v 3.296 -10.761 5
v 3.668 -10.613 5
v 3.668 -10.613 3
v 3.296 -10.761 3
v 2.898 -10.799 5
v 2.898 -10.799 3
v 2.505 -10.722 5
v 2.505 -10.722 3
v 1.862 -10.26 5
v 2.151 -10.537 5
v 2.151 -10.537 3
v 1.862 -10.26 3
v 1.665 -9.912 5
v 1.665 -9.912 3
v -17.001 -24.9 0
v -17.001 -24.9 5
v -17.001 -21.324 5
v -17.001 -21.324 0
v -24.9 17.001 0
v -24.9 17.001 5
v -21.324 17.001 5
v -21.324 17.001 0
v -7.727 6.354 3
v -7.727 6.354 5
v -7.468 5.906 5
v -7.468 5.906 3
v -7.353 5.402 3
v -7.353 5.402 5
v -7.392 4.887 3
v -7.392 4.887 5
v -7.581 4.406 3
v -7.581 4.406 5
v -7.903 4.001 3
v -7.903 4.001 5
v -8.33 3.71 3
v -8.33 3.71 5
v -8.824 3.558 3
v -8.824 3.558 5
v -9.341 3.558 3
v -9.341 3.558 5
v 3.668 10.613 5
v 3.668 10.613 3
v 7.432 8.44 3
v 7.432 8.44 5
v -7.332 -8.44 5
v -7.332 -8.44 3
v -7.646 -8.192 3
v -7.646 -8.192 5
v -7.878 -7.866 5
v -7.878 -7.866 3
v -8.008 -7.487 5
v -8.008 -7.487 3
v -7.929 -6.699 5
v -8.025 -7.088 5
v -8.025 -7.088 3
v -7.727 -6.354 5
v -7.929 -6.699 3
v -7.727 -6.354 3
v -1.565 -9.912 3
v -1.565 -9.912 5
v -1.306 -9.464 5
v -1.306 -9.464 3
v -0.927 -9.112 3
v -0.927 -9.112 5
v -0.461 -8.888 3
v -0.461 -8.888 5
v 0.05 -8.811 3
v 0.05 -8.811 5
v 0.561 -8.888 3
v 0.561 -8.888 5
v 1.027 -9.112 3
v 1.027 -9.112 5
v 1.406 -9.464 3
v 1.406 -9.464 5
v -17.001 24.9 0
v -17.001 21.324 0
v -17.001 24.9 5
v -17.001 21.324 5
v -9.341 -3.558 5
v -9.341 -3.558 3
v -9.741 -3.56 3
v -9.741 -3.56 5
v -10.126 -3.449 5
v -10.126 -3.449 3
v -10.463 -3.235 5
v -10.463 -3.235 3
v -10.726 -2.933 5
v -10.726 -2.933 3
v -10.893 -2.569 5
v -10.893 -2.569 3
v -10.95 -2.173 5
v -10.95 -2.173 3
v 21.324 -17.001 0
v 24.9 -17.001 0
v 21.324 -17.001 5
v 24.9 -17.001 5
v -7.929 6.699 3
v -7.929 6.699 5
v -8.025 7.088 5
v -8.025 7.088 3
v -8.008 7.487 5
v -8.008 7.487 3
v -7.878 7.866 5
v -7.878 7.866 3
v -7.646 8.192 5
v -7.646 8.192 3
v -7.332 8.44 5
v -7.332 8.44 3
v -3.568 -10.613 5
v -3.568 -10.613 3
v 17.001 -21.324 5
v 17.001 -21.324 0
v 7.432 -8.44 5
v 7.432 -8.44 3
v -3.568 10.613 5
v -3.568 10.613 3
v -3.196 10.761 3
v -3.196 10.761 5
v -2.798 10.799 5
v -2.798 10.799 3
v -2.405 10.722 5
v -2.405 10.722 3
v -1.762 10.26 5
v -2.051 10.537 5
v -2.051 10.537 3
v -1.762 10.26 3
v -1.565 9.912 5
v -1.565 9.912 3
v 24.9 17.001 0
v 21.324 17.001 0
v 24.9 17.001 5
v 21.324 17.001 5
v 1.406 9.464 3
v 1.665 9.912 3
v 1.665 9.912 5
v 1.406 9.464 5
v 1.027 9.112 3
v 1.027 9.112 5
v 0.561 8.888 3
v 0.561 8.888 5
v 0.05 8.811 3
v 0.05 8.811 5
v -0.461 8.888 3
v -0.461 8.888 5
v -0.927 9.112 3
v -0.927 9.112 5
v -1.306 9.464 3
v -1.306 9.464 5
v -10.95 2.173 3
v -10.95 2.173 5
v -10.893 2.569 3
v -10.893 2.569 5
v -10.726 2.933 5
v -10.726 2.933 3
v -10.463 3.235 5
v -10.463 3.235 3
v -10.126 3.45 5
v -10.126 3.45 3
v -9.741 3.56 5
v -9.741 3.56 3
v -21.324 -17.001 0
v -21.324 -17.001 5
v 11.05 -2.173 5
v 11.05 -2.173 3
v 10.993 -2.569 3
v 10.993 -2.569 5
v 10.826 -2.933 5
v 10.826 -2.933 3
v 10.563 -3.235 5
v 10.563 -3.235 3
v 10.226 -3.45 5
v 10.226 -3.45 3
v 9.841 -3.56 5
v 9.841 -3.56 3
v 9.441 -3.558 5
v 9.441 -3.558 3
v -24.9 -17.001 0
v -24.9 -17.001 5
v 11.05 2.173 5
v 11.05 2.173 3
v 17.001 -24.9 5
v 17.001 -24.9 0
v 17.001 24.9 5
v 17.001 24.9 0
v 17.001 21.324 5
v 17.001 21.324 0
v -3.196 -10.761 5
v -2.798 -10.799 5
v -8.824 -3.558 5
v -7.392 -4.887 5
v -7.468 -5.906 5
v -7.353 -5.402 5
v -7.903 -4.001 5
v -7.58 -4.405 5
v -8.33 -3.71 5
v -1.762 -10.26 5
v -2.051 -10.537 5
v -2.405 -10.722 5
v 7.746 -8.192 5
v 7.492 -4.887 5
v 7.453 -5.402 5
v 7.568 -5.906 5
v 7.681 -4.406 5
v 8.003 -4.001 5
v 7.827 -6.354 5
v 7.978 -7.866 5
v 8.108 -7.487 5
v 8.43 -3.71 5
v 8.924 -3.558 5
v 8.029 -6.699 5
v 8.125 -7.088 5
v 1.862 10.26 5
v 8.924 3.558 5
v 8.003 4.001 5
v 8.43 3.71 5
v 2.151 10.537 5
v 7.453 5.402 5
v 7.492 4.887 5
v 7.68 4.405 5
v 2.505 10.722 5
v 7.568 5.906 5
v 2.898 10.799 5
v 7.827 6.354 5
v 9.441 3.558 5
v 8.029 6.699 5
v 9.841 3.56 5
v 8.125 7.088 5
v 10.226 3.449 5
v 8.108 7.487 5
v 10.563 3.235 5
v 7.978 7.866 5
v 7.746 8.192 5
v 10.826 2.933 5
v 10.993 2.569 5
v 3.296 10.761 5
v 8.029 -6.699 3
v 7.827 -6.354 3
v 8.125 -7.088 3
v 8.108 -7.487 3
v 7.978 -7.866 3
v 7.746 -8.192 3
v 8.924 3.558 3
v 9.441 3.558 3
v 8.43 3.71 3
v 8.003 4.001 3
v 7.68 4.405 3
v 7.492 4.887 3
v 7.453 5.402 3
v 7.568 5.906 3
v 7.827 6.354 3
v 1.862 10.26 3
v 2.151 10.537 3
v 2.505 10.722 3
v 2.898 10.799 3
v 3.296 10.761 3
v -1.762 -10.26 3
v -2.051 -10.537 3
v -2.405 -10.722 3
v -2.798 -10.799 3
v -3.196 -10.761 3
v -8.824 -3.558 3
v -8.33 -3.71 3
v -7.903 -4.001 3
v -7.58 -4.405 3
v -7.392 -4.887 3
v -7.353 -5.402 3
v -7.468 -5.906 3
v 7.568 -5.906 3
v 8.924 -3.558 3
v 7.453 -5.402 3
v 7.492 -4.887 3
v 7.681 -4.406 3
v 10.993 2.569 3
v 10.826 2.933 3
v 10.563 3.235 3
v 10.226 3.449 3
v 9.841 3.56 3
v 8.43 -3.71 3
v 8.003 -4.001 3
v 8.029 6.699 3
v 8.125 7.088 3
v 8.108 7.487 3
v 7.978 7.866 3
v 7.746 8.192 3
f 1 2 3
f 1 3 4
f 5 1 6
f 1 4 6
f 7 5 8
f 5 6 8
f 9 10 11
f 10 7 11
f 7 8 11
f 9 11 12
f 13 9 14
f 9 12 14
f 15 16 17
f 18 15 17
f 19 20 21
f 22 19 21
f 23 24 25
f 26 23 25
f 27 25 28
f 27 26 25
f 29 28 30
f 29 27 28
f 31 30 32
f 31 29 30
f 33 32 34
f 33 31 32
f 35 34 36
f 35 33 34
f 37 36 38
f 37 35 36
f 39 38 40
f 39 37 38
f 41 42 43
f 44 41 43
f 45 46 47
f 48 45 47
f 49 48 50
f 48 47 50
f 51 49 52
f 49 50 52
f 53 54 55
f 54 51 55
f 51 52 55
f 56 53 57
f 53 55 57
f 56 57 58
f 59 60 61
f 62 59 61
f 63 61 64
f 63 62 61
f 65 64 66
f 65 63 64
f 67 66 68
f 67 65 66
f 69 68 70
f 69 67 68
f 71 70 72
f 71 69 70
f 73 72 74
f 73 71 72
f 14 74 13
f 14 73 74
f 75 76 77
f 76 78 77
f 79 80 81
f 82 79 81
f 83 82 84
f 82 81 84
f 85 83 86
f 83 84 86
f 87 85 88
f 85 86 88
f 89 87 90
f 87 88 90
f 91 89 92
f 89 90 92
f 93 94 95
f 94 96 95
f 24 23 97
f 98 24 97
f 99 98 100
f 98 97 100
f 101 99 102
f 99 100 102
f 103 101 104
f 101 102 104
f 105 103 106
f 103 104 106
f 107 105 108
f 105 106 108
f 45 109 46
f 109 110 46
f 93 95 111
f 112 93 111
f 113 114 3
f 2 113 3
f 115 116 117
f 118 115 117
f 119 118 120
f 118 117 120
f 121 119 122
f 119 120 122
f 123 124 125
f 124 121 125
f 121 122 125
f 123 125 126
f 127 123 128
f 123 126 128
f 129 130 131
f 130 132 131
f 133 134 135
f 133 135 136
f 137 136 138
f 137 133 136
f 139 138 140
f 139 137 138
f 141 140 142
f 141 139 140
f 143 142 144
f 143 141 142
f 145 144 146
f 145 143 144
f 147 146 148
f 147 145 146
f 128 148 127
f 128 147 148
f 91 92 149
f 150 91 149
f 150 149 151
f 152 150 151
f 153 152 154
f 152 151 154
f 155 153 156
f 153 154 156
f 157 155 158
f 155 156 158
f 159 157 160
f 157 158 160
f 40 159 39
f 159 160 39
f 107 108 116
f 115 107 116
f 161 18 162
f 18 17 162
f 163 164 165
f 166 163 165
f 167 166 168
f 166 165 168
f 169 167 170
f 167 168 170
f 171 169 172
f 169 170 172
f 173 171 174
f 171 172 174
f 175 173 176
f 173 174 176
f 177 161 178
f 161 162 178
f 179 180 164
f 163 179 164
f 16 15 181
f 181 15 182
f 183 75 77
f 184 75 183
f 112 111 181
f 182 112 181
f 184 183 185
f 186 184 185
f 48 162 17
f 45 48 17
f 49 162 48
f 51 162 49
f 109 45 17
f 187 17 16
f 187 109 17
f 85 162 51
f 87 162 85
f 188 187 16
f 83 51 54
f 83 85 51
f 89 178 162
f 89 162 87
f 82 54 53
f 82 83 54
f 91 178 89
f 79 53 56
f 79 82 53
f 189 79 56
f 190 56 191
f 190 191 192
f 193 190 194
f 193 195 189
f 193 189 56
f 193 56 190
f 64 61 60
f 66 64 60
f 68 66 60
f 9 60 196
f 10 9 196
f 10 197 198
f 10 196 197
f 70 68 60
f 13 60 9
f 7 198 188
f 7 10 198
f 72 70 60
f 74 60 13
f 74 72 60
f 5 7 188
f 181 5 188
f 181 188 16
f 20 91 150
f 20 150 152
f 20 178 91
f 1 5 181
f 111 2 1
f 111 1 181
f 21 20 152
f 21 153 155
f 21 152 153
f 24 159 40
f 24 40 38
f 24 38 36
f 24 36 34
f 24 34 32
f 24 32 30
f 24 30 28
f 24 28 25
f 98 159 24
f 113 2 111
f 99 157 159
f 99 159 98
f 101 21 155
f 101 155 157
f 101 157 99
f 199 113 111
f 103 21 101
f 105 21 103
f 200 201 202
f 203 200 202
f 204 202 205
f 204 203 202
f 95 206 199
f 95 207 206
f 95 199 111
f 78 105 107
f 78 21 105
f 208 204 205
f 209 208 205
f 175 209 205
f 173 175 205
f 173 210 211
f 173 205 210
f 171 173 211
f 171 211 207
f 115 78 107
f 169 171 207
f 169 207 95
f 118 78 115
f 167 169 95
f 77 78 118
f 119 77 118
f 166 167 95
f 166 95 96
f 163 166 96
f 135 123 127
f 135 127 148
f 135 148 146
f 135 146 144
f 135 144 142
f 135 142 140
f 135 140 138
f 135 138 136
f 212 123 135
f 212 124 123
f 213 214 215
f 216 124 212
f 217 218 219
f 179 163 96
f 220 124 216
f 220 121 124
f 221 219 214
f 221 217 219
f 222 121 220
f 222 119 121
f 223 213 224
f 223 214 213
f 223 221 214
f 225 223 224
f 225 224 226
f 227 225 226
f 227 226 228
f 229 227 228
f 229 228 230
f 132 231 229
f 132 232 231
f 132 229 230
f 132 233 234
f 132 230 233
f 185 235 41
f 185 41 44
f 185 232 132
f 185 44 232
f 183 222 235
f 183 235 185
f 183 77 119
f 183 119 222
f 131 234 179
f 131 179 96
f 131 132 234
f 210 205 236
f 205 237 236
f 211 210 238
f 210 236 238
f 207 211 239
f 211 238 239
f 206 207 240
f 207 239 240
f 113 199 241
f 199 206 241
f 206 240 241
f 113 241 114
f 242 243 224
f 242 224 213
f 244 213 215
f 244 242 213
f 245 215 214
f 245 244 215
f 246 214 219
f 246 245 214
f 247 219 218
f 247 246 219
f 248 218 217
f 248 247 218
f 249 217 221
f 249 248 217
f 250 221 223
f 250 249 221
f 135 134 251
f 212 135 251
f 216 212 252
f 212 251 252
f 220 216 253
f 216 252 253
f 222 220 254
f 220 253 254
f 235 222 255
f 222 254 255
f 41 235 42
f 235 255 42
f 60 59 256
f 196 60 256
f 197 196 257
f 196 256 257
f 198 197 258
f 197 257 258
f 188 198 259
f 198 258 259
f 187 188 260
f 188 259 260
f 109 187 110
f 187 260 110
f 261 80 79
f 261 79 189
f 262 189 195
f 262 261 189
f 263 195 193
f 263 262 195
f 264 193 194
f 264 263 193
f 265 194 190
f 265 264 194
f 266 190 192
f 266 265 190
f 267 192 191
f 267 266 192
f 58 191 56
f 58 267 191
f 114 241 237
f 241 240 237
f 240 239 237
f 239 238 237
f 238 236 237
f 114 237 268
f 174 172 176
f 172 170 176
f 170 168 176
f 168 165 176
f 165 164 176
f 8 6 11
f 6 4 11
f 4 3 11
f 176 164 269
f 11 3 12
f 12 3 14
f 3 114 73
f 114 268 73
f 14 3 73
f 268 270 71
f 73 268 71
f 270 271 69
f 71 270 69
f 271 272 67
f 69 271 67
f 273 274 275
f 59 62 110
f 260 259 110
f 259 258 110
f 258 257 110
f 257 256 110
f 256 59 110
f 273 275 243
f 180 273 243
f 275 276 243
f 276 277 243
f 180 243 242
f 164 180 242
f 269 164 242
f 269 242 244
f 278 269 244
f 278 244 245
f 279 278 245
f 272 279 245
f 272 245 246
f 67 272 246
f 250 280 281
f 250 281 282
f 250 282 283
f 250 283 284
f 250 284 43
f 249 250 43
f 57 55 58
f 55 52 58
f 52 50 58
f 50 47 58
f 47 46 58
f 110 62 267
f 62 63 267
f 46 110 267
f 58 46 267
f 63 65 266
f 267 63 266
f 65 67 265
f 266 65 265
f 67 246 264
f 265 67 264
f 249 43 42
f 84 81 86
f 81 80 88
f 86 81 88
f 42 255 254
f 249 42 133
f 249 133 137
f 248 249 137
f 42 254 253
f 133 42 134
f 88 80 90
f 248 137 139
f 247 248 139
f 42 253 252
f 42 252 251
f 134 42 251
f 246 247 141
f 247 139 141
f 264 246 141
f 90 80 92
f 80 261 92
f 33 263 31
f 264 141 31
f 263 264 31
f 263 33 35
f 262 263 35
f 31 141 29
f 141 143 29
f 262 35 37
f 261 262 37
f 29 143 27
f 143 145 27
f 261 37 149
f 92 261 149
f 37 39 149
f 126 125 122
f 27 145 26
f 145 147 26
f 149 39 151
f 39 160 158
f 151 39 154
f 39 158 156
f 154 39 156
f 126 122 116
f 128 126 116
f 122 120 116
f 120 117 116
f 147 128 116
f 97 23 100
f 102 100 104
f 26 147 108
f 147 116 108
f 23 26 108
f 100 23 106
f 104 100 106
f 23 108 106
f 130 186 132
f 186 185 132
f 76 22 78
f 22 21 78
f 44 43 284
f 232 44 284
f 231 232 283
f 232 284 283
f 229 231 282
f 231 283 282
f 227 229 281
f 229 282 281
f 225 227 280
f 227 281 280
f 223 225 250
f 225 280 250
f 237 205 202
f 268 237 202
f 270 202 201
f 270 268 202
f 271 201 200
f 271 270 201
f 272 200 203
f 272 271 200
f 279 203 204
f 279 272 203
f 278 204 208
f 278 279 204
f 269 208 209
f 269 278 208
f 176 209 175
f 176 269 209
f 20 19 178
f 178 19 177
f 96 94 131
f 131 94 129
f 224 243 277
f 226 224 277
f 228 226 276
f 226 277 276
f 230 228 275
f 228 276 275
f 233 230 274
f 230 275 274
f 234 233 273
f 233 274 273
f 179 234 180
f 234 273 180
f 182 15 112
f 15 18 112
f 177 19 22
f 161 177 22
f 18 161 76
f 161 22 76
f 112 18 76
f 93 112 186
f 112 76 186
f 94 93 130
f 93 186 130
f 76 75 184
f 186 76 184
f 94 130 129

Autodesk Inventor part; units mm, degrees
ref_plane "YZ Plane" through (0, 0, 0) normal (1, 0, 0) x (0, 1, 0)
ref_plane "XZ Plane" through (0, 0, 0) normal (0, 1, 0) x (-1, 0, 0)
ref_plane "XY Plane" through (0, 0, 0) normal (0, 0, 1) x (1, 0, 0)
sketch "Sketch1" plane through (0, 0, 0) normal (0, 0, 1) x (1, 0, 0)
  line L0 (-34.86, 0) -> (34.86, 0) construction
  line L1 (0, -34.86) -> (0, 34.86) construction
  line L2 (0, 0) -> (11.1575, 11.1575) construction
  line L3 (0, 0) -> (15.7791, 0) construction
  line L4 (0, 24.9) -> (16.8009, 24.9)
  line L5 (16.8009, 24.9) -> (16.8009, 21.2415)
  line L6 (16.8009, 21.2415) -> (19.0212, 19.0212)
  line L7 (24.9, 0) -> (24.9, 16.8009)
  line L8 (24.9, 16.8009) -> (21.2415, 16.8009)
  line L9 (21.2415, 16.8009) -> (19.0212, 19.0212)
  line L10 (0, -24.9) -> (16.8009, -24.9)
  line L11 (16.8009, -24.9) -> (16.8009, -21.2415)
  line L12 (16.8009, -21.2415) -> (19.0212, -19.0212)
  line L13 (24.9, 0) -> (24.9, -16.8009)
  line L14 (24.9, -16.8009) -> (21.2415, -16.8009)
  line L15 (21.2415, -16.8009) -> (19.0212, -19.0212)
  line L16 (0, 24.9) -> (-16.8009, 24.9)
  line L17 (-16.8009, 24.9) -> (-16.8009, 21.2415)
  line L18 (-16.8009, 21.2415) -> (-19.0212, 19.0212)
  line L19 (-24.9, 16.8009) -> (-21.2415, 16.8009)
  line L20 (-21.2415, 16.8009) -> (-19.0212, 19.0212)
  line L21 (0, -24.9) -> (-16.8009, -24.9)
  line L22 (-16.8009, -24.9) -> (-16.8009, -21.2415)
  line L23 (-16.8009, -21.2415) -> (-19.0212, -19.0212)
  line L24 (-21.2415, -16.8009) -> (-19.0212, -19.0212)
  line L25 (-24.9, -16.8009) -> (-21.2415, -16.8009)
  line L26 (-24.9, 0) -> (-24.9, -16.8009)
  line L27 (-24.9, 0) -> (-24.9, 16.8009)
  circle A0 centre (0, 0) radius 12.5
  dimension "d0" = 45
  dimension "d2" = 24.9
  dimension "d3" = 3.14
  dimension "d4" = 26.9
  dimension "d5" = 25
extrude "Extrusion1" add sketch "Sketch1" along normal blind 5
sketch "Sketch3" plane through (0, 0, 0) normal (0, 0, -1) x (-1, 0, 0)
  circle A0 centre (0, 0) radius 12.5 projected
extrude "Extrusion3" add sketch "Sketch3" against normal blind 3
sketch "Sketch4" plane through (0, 0, 3) normal (0, 0, 1) x (1, 0, 0)
  circle A0 centre (0, 0) radius 12.5 projected
  arc A1 (-2.4955, 9.5466) -> (2.5955, 9.5466) centre (0.05, 10.5454) ccw
  arc A2 (-2.4955, 9.5466) -> (-3.0679, 9.7469) centre (-2.8679, 9.4005) ccw
  line L0 (-3.0679, 9.7469) -> (-6.8321, 7.5736)
  arc A3 (-6.8321, 7.5736) -> (-6.9449, 6.9778) centre (-6.6321, 7.2272) ccw
  arc A4 (-9.4904, 2.5688) -> (-6.9449, 6.9778) centre (-9.0826, 5.2727) ccw
  arc A5 (2.5955, -9.5466) -> (-2.4955, -9.5466) centre (0.05, -10.5454) ccw
  arc A6 (2.5955, -9.5466) -> (3.1679, -9.7469) centre (2.9679, -9.4005) ccw
  line L1 (3.1679, -9.7469) -> (6.9321, -7.5736)
  arc A7 (6.9321, -7.5736) -> (7.0449, -6.9778) centre (6.7321, -7.2272) ccw
  arc A8 (9.5904, -2.5688) -> (7.0449, -6.9778) centre (9.1826, -5.2727) ccw
  line L2 (5.3229, -1.93) -> (5.3229, -1.58)
  line L3 (5.3229, -1.58) -> (5.9268, -1.58)
  line L4 (6.2768, -2.56) -> (5.9268, -2.56)
  line L5 (5.9268, -2.56) -> (5.9268, -1.93)
  line L6 (5.9268, -1.93) -> (5.3229, -1.93)
  circle A9 centre (0.05, 0) radius 3.3699
  line L7 (1.2704, -6.4878) -> (4.6724, -4.4373)
  line L8 (4.6724, -4.4373) -> (5.9738, -6.5964)
  line L9 (5.9738, -6.5964) -> (2.5718, -8.647)
  line L10 (2.5718, -8.647) -> (1.2704, -6.4878)
  line L11 (-2.4718, 8.647) -> (-1.1704, 6.4878)
  line L12 (-1.1704, 6.4878) -> (-4.5724, 4.4373)
  line L13 (-4.5724, 4.4373) -> (-5.8738, 6.5964)
  line L14 (-5.8738, 6.5964) -> (-2.4718, 8.647)
  arc A10 (-3.5679, -10.6129) -> (-1.5646, -9.9119) centre (-2.8679, -9.4005) ccw
  line L15 (-3.5679, -10.6129) -> (-7.3321, -8.4396)
  arc A11 (-7.7266, -6.3542) -> (-7.3321, -8.4396) centre (-6.6321, -7.2272) ccw
  arc A12 (-7.7266, -6.3542) -> (-9.3412, -3.5577) centre (-9.0826, -5.2727) ccw
  arc A13 (-10.95, -2.1733) -> (-9.3412, -3.5577) centre (-9.55, -2.1733) ccw
  line L16 (-10.95, -2.1733) -> (-10.95, 2.1733)
  arc A14 (-9.3412, 3.5577) -> (-10.95, 2.1733) centre (-9.55, 2.1733) ccw
  arc A15 (-9.3412, 3.5577) -> (-7.7266, 6.3542) centre (-9.0826, 5.2727) ccw
  arc A16 (-7.3321, 8.4396) -> (-7.7266, 6.3542) centre (-6.6321, 7.2272) ccw
  line L17 (-7.3321, 8.4396) -> (-3.5679, 10.6129)
  arc A17 (-1.5646, 9.9119) -> (-3.5679, 10.6129) centre (-2.8679, 9.4005) ccw
  arc A18 (-1.5646, 9.9119) -> (1.6646, 9.9119) centre (0.05, 10.5454) ccw
  arc A19 (3.6679, 10.6129) -> (1.6646, 9.9119) centre (2.9679, 9.4005) ccw
  line L18 (3.6679, 10.6129) -> (7.4321, 8.4396)
  arc A20 (7.8266, 6.3542) -> (7.4321, 8.4396) centre (6.7321, 7.2272) ccw
  arc A21 (7.8266, 6.3542) -> (9.4412, 3.5577) centre (9.1826, 5.2727) ccw
  arc A22 (11.05, 2.1733) -> (9.4412, 3.5577) centre (9.65, 2.1733) ccw
  line L19 (11.05, 2.1733) -> (11.05, -2.1733)
  arc A23 (9.4412, -3.5577) -> (11.05, -2.1733) centre (9.65, -2.1733) ccw
  arc A24 (9.4412, -3.5577) -> (7.8266, -6.3542) centre (9.1826, -5.2727) ccw
  arc A25 (7.4321, -8.4396) -> (7.8266, -6.3542) centre (6.7321, -7.2272) ccw
  line L20 (7.4321, -8.4396) -> (3.6679, -10.6129)
  arc A26 (1.6646, -9.9119) -> (3.6679, -10.6129) centre (2.9679, -9.4005) ccw
  arc A27 (1.6646, -9.9119) -> (-1.5646, -9.9119) centre (0.05, -10.5454) ccw
  arc A28 (7.0449, 6.9778) -> (6.9321, 7.5736) centre (6.7321, 7.2272) ccw
  line L21 (6.9321, 7.5736) -> (3.1679, 9.7469)
  arc A29 (3.1679, 9.7469) -> (2.5955, 9.5466) centre (2.9679, 9.4005) ccw
  arc A30 (-9.4904, 2.5688) -> (-9.95, 2.1733) centre (-9.55, 2.1733) ccw
  line L22 (-9.95, 2.1733) -> (-9.95, -2.1733)
  arc A31 (-9.95, -2.1733) -> (-9.4904, -2.5688) centre (-9.55, -2.1733) ccw
  arc A32 (-6.9449, -6.9778) -> (-9.4904, -2.5688) centre (-9.0826, -5.2727) ccw
  arc A33 (-6.9449, -6.9778) -> (-6.8321, -7.5736) centre (-6.6321, -7.2272) ccw
  line L23 (-6.8321, -7.5736) -> (-3.0679, -9.7469)
  arc A34 (-3.0679, -9.7469) -> (-2.4955, -9.5466) centre (-2.8679, -9.4005) ccw
  arc A35 (9.5904, -2.5688) -> (10.05, -2.1733) centre (9.65, -2.1733) ccw
  line L24 (10.05, -2.1733) -> (10.05, 2.1733)
  arc A36 (10.05, 2.1733) -> (9.5904, 2.5688) centre (9.65, 2.1733) ccw
  arc A37 (7.0449, 6.9778) -> (9.5904, 2.5688) centre (9.1826, 5.2727) ccw
  line L25 (5.9268, -1.58) -> (5.9268, -0.96)
  line L26 (5.9268, -0.96) -> (6.2768, -0.96)
  line L27 (6.2768, -0.96) -> (6.2768, -1.58)
  line L28 (6.2768, -1.58) -> (6.9229, -1.58)
  line L29 (6.9229, -1.58) -> (6.9229, -1.93)
  line L30 (6.9229, -1.93) -> (6.2768, -1.93)
  line L31 (6.2768, -1.93) -> (6.2768, -2.56)
  line L32 (-1.1704, -6.4878) -> (-2.4718, -8.647)
  line L33 (-2.4718, -8.647) -> (-5.8738, -6.5964)
  line L34 (-5.8738, -6.5964) -> (-4.5724, -4.4373)
  line L35 (-4.5724, -4.4373) -> (-1.1704, -6.4878)
  line L36 (5.9738, 6.5964) -> (4.6724, 4.4373)
  line L37 (4.6724, 4.4373) -> (1.2704, 6.4878)
  line L38 (1.2704, 6.4878) -> (2.5718, 8.647)
  line L39 (2.5718, 8.647) -> (5.9738, 6.5964)
  line L40 (-8.6062, -2.0991) -> (-8.6062, 0.1709)
  line L41 (-8.6062, 0.1709) -> (-5.5375, 0.1709)
  line L42 (-5.5375, 0.1709) -> (-5.5375, -2.0991)
  line L43 (-5.5375, -2.0991) -> (-8.6062, -2.0991)
  line L44 (-6.8834, 0.8144) -> (-6.8834, 2.4144)
  line L45 (-6.8834, 2.4144) -> (-6.5334, 2.4144)
  line L46 (-6.5334, 2.4144) -> (-6.5334, 0.8144)
  line L47 (-6.5334, 0.8144) -> (-6.8834, 0.8144)
  line L48 (5.5596, -0.1311) -> (5.5596, 2.208)
  line L49 (5.5596, 2.208) -> (8.9002, 2.208)
  line L50 (8.9002, 2.208) -> (8.9002, -0.1311)
  line L51 (8.9002, -0.1311) -> (5.5596, -0.1311)
  point P0 (0.05, 10.5454)
  point P1 (-9.0826, 5.2727)
  point P2 (0.05, -10.5454)
  point P3 (9.1826, -5.2727)
  dimension "d15" = 1
extrude "Extrusion4" add sketch "Sketch4" along normal up to surface (2 mm away) contours A0
sketch "Skizze5" plane through (0, 0, 5) normal (0, 0, 1) x (1, 0, 0)
  line L0 (-7.3321, -8.4396) -> (-3.5679, -10.6129) construction
  arc A0 (-7.7266, -6.3542) -> (-7.3321, -8.4396) centre (-6.6321, -7.2272) ccw construction
  arc A1 (-7.7266, -6.3542) -> (-9.3412, -3.5577) centre (-9.0826, -5.2727) ccw construction
  arc A2 (-10.95, -2.1733) -> (-9.3412, -3.5577) centre (-9.55, -2.1733) ccw construction
  line L1 (-10.95, 2.1733) -> (-10.95, -2.1733) construction
  arc A3 (-9.3412, 3.5577) -> (-10.95, 2.1733) centre (-9.55, 2.1733) ccw construction
  arc A4 (-9.3412, 3.5577) -> (-7.7266, 6.3542) centre (-9.0826, 5.2727) ccw construction
  arc A5 (-7.3321, 8.4396) -> (-7.7266, 6.3542) centre (-6.6321, 7.2272) ccw construction
  line L2 (-3.5679, 10.6129) -> (-7.3321, 8.4396) construction
  arc A6 (-1.5646, 9.9119) -> (-3.5679, 10.6129) centre (-2.8679, 9.4005) ccw construction
  arc A7 (-1.5646, 9.9119) -> (1.6646, 9.9119) centre (0.05, 10.5454) ccw construction
  arc A8 (3.6679, 10.6129) -> (1.6646, 9.9119) centre (2.9679, 9.4005) ccw construction
  line L3 (7.4321, 8.4396) -> (3.6679, 10.6129) construction
  arc A9 (7.8266, 6.3542) -> (7.4321, 8.4396) centre (6.7321, 7.2272) ccw construction
  arc A10 (7.8266, 6.3542) -> (9.4412, 3.5577) centre (9.1826, 5.2727) ccw construction
  arc A11 (11.05, 2.1733) -> (9.4412, 3.5577) centre (9.65, 2.1733) ccw construction
  line L4 (11.05, -2.1733) -> (11.05, 2.1733) construction
  arc A12 (9.4412, -3.5577) -> (11.05, -2.1733) centre (9.65, -2.1733) ccw construction
  arc A13 (9.4412, -3.5577) -> (7.8266, -6.3542) centre (9.1826, -5.2727) ccw construction
  arc A14 (7.4321, -8.4396) -> (7.8266, -6.3542) centre (6.7321, -7.2272) ccw construction
  line L5 (3.6679, -10.6129) -> (7.4321, -8.4396) construction
  arc A15 (1.6646, -9.9119) -> (3.6679, -10.6129) centre (2.9679, -9.4005) ccw construction
  arc A16 (1.6646, -9.9119) -> (-1.5646, -9.9119) centre (0.05, -10.5454) ccw construction
  arc A17 (-3.5679, -10.6129) -> (-1.5646, -9.9119) centre (-2.8679, -9.4005) ccw construction
  line L6 (16.8009, 24.9) -> (-16.8009, 24.9) construction
  line L7 (-16.8009, 24.9) -> (-16.8009, 21.2415) projected
  line L8 (-16.8009, 21.2415) -> (-21.2415, 16.8009) projected
  line L9 (-21.2415, 16.8009) -> (-24.9, 16.8009) projected
  line L10 (-24.9, 16.8009) -> (-24.9, -16.8009) construction
  line L11 (-24.9, -16.8009) -> (-21.2415, -16.8009) projected
  line L12 (-21.2415, -16.8009) -> (-16.8009, -21.2415) projected
  line L13 (-16.8009, -21.2415) -> (-16.8009, -24.9) projected
  line L14 (-16.8009, -24.9) -> (16.8009, -24.9) construction
  line L15 (16.8009, -24.9) -> (16.8009, -21.2415) projected
  line L16 (16.8009, -21.2415) -> (21.2415, -16.8009) projected
  line L17 (21.2415, -16.8009) -> (24.9, -16.8009) projected
  line L18 (24.9, -16.8009) -> (24.9, 16.8009) construction
  line L19 (24.9, 16.8009) -> (21.2415, 16.8009) projected
  line L20 (21.2415, 16.8009) -> (16.8009, 21.2415) projected
  line L21 (16.8009, 21.2415) -> (16.8009, 24.9) projected
  line L22 (-17.0009, 25.1) -> (17.0009, 25.1) construction
  line L23 (17.0009, 25.1) -> (17.0009, 21.3243)
  line L24 (17.0009, 21.3243) -> (21.3243, 17.0009)
  line L25 (21.3243, 17.0009) -> (25.1, 17.0009)
  line L26 (25.1, 17.0009) -> (25.1, -17.0009) construction
  line L27 (25.1, -17.0009) -> (21.3243, -17.0009)
  line L28 (21.3243, -17.0009) -> (17.0009, -21.3243)
  line L29 (17.0009, -21.3243) -> (17.0009, -25.1)
  line L30 (17.0009, -25.1) -> (-17.0009, -25.1) construction
  line L31 (-17.0009, -25.1) -> (-17.0009, -21.3243)
  line L32 (-17.0009, -21.3243) -> (-21.3243, -17.0009)
  line L33 (-21.3243, -17.0009) -> (-25.1, -17.0009)
  line L34 (-25.1, -17.0009) -> (-25.1, 17.0009) construction
  line L35 (-25.1, 17.0009) -> (-21.3243, 17.0009)
  line L36 (-21.3243, 17.0009) -> (-17.0009, 21.3243)
  line L37 (-17.0009, 21.3243) -> (-17.0009, 25.1)
  line L38 (-21.2415, 16.8009) -> (-24.9, 16.8009) projected
  line L39 (-24.9, 16.8009) -> (-24.9, 17.0009)
  line L40 (-16.8009, 24.9) -> (-17.0009, 24.9)
  line L41 (16.8009, 24.9) -> (-16.8009, 24.9) projected
  line L42 (16.8009, 24.9) -> (17.0009, 24.9)
  line L43 (24.9, 16.8009) -> (21.2415, 16.8009) projected
  line L44 (24.9, 16.8009) -> (24.9, 17.0009)
  line L45 (24.9, -16.8009) -> (24.9, -17.0009)
  line L46 (16.8009, -24.9) -> (16.8009, -21.2415) projected
  line L47 (16.8009, -24.9) -> (17.0009, -24.9)
  line L48 (-16.8009, -21.2415) -> (-16.8009, -24.9) projected
  line L49 (-16.8009, -24.9) -> (-17.0009, -24.9)
  line L50 (-24.9, -16.8009) -> (-24.9, -17.0009)
  point P0 (0, 0)
  dimension "d18" = 0.2
extrude "IM_offset" add sketch "Skizze5" against normal up to surface (5 mm away)
properties part number "20_Cube_insert_Sample_holder"
